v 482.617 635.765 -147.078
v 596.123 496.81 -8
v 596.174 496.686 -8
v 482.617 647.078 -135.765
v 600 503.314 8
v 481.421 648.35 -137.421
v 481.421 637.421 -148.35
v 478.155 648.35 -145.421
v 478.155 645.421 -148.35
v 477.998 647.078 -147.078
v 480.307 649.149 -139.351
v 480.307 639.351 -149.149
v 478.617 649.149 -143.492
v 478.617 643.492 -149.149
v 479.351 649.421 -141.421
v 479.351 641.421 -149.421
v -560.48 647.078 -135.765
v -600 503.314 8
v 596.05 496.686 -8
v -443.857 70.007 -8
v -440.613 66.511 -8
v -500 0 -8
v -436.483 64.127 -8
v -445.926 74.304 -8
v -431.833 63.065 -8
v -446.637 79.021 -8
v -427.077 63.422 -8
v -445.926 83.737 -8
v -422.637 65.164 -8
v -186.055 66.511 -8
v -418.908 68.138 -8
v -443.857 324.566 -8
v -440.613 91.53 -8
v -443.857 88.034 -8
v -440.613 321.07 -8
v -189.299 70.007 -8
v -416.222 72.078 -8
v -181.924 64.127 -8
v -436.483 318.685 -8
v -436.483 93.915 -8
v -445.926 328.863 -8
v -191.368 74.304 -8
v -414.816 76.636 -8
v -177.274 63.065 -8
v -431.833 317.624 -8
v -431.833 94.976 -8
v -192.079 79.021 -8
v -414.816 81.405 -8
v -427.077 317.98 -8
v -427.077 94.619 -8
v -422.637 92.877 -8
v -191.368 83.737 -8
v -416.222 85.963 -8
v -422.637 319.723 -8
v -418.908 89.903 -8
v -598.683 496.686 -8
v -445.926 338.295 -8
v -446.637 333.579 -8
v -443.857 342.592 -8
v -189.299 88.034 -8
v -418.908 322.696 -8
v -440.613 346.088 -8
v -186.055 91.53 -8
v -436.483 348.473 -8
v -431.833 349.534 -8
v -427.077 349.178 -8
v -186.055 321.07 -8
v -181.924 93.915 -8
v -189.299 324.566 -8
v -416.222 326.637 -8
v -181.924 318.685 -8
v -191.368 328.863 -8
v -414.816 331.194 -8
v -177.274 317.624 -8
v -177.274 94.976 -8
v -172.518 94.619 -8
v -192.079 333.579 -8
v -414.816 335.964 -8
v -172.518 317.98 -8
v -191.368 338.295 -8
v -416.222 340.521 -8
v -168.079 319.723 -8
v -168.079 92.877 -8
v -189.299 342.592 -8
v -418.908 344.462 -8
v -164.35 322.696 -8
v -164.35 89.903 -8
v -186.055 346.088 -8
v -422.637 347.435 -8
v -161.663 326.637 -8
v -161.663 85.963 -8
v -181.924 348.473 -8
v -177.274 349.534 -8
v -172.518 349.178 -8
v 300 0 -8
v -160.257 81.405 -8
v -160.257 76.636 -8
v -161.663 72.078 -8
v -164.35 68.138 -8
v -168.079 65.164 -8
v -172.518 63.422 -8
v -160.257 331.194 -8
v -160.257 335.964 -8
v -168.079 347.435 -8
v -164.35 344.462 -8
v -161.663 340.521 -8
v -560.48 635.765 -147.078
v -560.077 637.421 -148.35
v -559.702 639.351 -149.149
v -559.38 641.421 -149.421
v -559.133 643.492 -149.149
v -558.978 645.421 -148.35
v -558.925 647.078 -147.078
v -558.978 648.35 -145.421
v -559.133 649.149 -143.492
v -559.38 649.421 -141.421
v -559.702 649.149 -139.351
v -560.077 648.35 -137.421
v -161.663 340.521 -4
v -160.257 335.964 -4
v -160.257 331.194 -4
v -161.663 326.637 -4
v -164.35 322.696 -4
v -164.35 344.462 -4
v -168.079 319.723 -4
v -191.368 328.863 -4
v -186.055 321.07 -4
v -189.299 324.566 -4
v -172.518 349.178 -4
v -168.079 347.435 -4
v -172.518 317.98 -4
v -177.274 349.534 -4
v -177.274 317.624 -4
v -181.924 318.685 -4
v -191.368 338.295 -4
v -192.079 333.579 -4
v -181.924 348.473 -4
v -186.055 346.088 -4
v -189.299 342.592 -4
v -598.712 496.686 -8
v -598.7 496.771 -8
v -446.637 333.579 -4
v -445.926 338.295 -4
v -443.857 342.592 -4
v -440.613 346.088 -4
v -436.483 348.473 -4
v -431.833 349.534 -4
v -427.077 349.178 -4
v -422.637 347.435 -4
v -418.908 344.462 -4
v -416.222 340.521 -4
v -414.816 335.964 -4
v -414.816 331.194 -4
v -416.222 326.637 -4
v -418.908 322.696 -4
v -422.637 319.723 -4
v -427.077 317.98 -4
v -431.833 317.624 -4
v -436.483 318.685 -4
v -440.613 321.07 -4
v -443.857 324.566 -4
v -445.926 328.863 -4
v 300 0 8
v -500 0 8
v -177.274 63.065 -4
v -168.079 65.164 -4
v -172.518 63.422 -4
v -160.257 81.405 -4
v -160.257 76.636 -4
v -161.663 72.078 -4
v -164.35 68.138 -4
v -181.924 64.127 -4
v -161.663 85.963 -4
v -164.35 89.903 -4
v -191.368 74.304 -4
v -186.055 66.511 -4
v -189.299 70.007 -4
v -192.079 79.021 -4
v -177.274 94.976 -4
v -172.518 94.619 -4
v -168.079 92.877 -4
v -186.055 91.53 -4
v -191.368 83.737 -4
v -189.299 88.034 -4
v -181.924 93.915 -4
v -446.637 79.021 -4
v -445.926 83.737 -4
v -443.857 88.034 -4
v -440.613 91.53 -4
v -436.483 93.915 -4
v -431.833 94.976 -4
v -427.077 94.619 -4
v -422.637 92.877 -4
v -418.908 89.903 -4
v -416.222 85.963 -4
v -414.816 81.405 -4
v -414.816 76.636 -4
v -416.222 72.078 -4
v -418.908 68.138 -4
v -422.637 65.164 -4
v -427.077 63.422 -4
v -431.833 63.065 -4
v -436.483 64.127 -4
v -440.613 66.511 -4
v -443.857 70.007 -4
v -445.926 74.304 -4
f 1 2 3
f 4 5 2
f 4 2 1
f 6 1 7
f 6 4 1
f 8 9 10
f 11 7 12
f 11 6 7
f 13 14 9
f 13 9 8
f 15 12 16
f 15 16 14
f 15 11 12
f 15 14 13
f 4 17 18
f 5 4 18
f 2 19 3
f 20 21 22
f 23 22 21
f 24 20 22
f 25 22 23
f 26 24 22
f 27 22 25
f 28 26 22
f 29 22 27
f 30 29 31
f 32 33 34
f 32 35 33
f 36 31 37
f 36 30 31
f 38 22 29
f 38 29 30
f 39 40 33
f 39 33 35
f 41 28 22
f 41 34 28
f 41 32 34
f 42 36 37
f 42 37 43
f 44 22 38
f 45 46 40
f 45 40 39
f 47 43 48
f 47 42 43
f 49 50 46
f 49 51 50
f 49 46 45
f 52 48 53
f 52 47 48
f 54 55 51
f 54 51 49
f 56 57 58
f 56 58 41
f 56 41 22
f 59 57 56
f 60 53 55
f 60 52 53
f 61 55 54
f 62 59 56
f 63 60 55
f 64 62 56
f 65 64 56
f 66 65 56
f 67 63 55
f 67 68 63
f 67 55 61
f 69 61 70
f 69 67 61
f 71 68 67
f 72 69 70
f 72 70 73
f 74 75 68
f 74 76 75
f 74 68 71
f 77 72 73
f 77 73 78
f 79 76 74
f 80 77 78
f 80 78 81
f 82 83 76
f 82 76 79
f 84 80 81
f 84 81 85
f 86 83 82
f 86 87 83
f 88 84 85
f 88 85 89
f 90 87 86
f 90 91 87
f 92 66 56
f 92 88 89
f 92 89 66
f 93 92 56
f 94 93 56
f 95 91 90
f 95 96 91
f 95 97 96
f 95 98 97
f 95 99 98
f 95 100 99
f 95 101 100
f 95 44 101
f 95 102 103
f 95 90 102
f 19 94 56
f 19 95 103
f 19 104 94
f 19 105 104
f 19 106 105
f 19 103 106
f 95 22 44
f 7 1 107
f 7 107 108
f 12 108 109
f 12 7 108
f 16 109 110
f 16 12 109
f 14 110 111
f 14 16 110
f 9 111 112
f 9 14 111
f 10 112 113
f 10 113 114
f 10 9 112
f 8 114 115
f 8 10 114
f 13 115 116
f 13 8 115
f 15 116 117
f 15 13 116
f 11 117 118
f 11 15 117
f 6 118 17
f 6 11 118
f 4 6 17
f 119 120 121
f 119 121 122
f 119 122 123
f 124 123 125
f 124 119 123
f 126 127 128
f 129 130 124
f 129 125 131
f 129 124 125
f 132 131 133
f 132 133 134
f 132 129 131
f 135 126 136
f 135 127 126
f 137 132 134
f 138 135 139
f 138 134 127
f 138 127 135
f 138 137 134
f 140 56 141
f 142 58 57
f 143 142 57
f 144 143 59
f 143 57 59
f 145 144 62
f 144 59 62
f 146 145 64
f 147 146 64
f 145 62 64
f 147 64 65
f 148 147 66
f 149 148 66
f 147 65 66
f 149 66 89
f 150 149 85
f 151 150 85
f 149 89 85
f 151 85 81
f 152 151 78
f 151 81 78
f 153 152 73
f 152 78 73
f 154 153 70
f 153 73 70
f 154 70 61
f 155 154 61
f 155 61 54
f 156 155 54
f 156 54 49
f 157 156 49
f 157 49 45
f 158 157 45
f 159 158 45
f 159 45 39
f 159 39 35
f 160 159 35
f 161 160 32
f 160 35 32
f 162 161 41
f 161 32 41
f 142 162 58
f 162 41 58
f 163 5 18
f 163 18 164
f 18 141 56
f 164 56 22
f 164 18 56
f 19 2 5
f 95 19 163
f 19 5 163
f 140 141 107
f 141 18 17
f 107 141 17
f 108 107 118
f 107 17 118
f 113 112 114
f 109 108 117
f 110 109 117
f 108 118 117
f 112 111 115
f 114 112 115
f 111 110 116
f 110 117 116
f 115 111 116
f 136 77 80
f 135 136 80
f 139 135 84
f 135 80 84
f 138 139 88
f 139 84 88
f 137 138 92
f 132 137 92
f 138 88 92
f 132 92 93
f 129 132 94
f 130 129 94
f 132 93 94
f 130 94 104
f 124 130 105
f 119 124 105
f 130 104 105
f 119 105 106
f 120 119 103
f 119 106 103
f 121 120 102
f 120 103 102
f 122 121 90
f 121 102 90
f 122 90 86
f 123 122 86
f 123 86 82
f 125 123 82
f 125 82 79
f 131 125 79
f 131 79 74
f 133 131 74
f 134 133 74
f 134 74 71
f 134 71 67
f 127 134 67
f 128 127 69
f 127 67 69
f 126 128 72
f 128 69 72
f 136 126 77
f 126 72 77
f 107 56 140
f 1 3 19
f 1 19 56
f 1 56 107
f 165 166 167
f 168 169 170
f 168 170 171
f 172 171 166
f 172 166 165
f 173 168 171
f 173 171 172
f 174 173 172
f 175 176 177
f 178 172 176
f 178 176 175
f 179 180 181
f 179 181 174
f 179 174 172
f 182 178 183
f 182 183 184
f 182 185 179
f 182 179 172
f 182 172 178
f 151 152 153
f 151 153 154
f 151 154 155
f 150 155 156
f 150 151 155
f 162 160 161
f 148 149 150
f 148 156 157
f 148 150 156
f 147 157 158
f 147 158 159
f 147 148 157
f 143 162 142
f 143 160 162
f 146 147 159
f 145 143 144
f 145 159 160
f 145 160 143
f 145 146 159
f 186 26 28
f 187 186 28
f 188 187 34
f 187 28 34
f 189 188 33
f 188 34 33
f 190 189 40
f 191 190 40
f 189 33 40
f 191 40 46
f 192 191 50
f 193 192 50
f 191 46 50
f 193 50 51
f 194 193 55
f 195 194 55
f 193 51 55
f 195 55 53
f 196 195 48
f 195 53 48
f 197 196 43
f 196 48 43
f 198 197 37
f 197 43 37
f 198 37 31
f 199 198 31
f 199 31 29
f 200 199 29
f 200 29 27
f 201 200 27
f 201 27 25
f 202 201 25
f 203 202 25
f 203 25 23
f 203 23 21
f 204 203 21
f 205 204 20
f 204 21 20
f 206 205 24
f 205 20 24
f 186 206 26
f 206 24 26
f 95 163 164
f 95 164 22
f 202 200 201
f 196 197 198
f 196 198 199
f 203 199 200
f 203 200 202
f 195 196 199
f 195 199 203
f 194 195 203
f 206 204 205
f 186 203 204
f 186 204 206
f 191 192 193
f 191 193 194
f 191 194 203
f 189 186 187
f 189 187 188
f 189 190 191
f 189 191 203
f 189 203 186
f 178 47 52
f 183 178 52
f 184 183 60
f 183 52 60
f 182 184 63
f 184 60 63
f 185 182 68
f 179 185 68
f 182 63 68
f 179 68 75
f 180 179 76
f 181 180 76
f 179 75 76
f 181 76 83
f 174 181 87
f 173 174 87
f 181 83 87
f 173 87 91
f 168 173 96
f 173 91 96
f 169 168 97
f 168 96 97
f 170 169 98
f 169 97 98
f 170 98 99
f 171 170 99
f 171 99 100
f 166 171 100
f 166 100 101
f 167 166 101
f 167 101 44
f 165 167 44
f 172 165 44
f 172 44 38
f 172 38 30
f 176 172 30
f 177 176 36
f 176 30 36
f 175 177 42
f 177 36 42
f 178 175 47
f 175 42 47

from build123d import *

# Parameters (mm, degrees)
BOSS_EXTRUDE1_DEPTH = 600
CUT_EXTRUDE2_DEPTH  = 16
CUT_EXTRUDE3_REACH  = 826.099
SKETCH5_R           = 16
CUT_EXTRUDE4_DEPTH  = 4


with BuildPart() as part:
    # Sketch1 → Boss-Extrude1 (new, symmetric)
    with BuildSketch(Plane(origin=(0, 0, 0), x_dir=(0, 0, -1), z_dir=(1, 0, 0))):
        with BuildLine():
            Line((8, 0), (8, 496.686291501))
            Line((8, 496.686291501), (147.078210487, 635.764501988))
            ThreePointArc((147.078210487, 635.764501988), (147.078210487, 647.078210487), (135.764501988, 647.078210487))
            Line((135.764501988, 647.078210487), (-8, 503.313708499))
            Line((-8, 503.313708499), (-8, 0))
            Line((-8, 0), (8, 0))
        make_face()
    extrude(amount=BOSS_EXTRUDE1_DEPTH, both=True)

    # Sketch2 → Cut-Extrude2 (cut)
    with BuildSketch(Plane.XY.offset(8)):
        Polygon((-600, 503.313708499), (-500, 0), (-600, 0), align=None)
        Polygon((600, 503.313708499), (300, 0), (600, 0), align=None)
    extrude(amount=-CUT_EXTRUDE2_DEPTH, mode=Mode.SUBTRACT)

    # Cut-Extrude3: up to this face of the body (flat: up to its plane)
    cut_extrude3_end = Plane(part.part.faces().sort_by_distance((0, 566.225396744, -77.539105243))[0])
    # Sketch3 → Cut-Extrude3 (cut, up to the picked face)
    with BuildSketch(Plane(origin=(0, 255.656854249, 255.656854249), x_dir=(1, 0, 0), z_dir=(0, 0.7071067811865477, 0.7071067811865475)), mode=Mode.PRIVATE) as cut_extrude3_sk1:
        Polygon((600, 350.239682094), (477.997973515, 561.553390593), (600, 561.553390593), align=None)
    cut_extrude3_tool1 = split(extrude(cut_extrude3_sk1.sketch, amount=-CUT_EXTRUDE3_REACH, mode=Mode.PRIVATE), bisect_by=cut_extrude3_end, keep=Keep.BOTH, mode=Mode.PRIVATE)
    # Sketch3 → Cut-Extrude3 (cut, up to the picked face)
    with BuildSketch(Plane(origin=(0, 255.656854249, 255.656854249), x_dir=(1, 0, 0), z_dir=(0, 0.7071067811865477, 0.7071067811865475)), mode=Mode.PRIVATE) as cut_extrude3_sk2:
        Polygon((-600, 350.239682094), (-558.924776017, 561.553390593), (-600, 561.553390593), align=None)
    cut_extrude3_tool2 = split(extrude(cut_extrude3_sk2.sketch, amount=-CUT_EXTRUDE3_REACH, mode=Mode.PRIVATE), bisect_by=cut_extrude3_end, keep=Keep.BOTH, mode=Mode.PRIVATE)
    add(cut_extrude3_tool1.solids().sort_by(Axis((559.332658, 602.927946, -91.614237), (0, -0.7071067811865477, -0.7071067811865475)))[0], mode=Mode.SUBTRACT)
    add(cut_extrude3_tool2.solids().sort_by(Axis((-586.308259, 602.927946, -91.614237), (0, -0.7071067811865477, -0.7071067811865475)))[0], mode=Mode.SUBTRACT)

    # Sketch5 → Cut-Extrude4 (cut)
    with BuildSketch(Plane(origin=(0, 0, -8), x_dir=(-1, 0, 0), z_dir=(0, 0, -1))):
        with Locations((430.63716206, 333.578975831)):
            Circle(SKETCH5_R)
        with Locations((176.078720833, 333.578975831)):
            Circle(SKETCH5_R)
        with Locations((176.078720833, 79.020534604)):
            Circle(SKETCH5_R)
        with Locations((430.63716206, 79.020534604)):
            Circle(SKETCH5_R)
    extrude(amount=-CUT_EXTRUDE4_DEPTH, mode=Mode.SUBTRACT)


solid = part.part
